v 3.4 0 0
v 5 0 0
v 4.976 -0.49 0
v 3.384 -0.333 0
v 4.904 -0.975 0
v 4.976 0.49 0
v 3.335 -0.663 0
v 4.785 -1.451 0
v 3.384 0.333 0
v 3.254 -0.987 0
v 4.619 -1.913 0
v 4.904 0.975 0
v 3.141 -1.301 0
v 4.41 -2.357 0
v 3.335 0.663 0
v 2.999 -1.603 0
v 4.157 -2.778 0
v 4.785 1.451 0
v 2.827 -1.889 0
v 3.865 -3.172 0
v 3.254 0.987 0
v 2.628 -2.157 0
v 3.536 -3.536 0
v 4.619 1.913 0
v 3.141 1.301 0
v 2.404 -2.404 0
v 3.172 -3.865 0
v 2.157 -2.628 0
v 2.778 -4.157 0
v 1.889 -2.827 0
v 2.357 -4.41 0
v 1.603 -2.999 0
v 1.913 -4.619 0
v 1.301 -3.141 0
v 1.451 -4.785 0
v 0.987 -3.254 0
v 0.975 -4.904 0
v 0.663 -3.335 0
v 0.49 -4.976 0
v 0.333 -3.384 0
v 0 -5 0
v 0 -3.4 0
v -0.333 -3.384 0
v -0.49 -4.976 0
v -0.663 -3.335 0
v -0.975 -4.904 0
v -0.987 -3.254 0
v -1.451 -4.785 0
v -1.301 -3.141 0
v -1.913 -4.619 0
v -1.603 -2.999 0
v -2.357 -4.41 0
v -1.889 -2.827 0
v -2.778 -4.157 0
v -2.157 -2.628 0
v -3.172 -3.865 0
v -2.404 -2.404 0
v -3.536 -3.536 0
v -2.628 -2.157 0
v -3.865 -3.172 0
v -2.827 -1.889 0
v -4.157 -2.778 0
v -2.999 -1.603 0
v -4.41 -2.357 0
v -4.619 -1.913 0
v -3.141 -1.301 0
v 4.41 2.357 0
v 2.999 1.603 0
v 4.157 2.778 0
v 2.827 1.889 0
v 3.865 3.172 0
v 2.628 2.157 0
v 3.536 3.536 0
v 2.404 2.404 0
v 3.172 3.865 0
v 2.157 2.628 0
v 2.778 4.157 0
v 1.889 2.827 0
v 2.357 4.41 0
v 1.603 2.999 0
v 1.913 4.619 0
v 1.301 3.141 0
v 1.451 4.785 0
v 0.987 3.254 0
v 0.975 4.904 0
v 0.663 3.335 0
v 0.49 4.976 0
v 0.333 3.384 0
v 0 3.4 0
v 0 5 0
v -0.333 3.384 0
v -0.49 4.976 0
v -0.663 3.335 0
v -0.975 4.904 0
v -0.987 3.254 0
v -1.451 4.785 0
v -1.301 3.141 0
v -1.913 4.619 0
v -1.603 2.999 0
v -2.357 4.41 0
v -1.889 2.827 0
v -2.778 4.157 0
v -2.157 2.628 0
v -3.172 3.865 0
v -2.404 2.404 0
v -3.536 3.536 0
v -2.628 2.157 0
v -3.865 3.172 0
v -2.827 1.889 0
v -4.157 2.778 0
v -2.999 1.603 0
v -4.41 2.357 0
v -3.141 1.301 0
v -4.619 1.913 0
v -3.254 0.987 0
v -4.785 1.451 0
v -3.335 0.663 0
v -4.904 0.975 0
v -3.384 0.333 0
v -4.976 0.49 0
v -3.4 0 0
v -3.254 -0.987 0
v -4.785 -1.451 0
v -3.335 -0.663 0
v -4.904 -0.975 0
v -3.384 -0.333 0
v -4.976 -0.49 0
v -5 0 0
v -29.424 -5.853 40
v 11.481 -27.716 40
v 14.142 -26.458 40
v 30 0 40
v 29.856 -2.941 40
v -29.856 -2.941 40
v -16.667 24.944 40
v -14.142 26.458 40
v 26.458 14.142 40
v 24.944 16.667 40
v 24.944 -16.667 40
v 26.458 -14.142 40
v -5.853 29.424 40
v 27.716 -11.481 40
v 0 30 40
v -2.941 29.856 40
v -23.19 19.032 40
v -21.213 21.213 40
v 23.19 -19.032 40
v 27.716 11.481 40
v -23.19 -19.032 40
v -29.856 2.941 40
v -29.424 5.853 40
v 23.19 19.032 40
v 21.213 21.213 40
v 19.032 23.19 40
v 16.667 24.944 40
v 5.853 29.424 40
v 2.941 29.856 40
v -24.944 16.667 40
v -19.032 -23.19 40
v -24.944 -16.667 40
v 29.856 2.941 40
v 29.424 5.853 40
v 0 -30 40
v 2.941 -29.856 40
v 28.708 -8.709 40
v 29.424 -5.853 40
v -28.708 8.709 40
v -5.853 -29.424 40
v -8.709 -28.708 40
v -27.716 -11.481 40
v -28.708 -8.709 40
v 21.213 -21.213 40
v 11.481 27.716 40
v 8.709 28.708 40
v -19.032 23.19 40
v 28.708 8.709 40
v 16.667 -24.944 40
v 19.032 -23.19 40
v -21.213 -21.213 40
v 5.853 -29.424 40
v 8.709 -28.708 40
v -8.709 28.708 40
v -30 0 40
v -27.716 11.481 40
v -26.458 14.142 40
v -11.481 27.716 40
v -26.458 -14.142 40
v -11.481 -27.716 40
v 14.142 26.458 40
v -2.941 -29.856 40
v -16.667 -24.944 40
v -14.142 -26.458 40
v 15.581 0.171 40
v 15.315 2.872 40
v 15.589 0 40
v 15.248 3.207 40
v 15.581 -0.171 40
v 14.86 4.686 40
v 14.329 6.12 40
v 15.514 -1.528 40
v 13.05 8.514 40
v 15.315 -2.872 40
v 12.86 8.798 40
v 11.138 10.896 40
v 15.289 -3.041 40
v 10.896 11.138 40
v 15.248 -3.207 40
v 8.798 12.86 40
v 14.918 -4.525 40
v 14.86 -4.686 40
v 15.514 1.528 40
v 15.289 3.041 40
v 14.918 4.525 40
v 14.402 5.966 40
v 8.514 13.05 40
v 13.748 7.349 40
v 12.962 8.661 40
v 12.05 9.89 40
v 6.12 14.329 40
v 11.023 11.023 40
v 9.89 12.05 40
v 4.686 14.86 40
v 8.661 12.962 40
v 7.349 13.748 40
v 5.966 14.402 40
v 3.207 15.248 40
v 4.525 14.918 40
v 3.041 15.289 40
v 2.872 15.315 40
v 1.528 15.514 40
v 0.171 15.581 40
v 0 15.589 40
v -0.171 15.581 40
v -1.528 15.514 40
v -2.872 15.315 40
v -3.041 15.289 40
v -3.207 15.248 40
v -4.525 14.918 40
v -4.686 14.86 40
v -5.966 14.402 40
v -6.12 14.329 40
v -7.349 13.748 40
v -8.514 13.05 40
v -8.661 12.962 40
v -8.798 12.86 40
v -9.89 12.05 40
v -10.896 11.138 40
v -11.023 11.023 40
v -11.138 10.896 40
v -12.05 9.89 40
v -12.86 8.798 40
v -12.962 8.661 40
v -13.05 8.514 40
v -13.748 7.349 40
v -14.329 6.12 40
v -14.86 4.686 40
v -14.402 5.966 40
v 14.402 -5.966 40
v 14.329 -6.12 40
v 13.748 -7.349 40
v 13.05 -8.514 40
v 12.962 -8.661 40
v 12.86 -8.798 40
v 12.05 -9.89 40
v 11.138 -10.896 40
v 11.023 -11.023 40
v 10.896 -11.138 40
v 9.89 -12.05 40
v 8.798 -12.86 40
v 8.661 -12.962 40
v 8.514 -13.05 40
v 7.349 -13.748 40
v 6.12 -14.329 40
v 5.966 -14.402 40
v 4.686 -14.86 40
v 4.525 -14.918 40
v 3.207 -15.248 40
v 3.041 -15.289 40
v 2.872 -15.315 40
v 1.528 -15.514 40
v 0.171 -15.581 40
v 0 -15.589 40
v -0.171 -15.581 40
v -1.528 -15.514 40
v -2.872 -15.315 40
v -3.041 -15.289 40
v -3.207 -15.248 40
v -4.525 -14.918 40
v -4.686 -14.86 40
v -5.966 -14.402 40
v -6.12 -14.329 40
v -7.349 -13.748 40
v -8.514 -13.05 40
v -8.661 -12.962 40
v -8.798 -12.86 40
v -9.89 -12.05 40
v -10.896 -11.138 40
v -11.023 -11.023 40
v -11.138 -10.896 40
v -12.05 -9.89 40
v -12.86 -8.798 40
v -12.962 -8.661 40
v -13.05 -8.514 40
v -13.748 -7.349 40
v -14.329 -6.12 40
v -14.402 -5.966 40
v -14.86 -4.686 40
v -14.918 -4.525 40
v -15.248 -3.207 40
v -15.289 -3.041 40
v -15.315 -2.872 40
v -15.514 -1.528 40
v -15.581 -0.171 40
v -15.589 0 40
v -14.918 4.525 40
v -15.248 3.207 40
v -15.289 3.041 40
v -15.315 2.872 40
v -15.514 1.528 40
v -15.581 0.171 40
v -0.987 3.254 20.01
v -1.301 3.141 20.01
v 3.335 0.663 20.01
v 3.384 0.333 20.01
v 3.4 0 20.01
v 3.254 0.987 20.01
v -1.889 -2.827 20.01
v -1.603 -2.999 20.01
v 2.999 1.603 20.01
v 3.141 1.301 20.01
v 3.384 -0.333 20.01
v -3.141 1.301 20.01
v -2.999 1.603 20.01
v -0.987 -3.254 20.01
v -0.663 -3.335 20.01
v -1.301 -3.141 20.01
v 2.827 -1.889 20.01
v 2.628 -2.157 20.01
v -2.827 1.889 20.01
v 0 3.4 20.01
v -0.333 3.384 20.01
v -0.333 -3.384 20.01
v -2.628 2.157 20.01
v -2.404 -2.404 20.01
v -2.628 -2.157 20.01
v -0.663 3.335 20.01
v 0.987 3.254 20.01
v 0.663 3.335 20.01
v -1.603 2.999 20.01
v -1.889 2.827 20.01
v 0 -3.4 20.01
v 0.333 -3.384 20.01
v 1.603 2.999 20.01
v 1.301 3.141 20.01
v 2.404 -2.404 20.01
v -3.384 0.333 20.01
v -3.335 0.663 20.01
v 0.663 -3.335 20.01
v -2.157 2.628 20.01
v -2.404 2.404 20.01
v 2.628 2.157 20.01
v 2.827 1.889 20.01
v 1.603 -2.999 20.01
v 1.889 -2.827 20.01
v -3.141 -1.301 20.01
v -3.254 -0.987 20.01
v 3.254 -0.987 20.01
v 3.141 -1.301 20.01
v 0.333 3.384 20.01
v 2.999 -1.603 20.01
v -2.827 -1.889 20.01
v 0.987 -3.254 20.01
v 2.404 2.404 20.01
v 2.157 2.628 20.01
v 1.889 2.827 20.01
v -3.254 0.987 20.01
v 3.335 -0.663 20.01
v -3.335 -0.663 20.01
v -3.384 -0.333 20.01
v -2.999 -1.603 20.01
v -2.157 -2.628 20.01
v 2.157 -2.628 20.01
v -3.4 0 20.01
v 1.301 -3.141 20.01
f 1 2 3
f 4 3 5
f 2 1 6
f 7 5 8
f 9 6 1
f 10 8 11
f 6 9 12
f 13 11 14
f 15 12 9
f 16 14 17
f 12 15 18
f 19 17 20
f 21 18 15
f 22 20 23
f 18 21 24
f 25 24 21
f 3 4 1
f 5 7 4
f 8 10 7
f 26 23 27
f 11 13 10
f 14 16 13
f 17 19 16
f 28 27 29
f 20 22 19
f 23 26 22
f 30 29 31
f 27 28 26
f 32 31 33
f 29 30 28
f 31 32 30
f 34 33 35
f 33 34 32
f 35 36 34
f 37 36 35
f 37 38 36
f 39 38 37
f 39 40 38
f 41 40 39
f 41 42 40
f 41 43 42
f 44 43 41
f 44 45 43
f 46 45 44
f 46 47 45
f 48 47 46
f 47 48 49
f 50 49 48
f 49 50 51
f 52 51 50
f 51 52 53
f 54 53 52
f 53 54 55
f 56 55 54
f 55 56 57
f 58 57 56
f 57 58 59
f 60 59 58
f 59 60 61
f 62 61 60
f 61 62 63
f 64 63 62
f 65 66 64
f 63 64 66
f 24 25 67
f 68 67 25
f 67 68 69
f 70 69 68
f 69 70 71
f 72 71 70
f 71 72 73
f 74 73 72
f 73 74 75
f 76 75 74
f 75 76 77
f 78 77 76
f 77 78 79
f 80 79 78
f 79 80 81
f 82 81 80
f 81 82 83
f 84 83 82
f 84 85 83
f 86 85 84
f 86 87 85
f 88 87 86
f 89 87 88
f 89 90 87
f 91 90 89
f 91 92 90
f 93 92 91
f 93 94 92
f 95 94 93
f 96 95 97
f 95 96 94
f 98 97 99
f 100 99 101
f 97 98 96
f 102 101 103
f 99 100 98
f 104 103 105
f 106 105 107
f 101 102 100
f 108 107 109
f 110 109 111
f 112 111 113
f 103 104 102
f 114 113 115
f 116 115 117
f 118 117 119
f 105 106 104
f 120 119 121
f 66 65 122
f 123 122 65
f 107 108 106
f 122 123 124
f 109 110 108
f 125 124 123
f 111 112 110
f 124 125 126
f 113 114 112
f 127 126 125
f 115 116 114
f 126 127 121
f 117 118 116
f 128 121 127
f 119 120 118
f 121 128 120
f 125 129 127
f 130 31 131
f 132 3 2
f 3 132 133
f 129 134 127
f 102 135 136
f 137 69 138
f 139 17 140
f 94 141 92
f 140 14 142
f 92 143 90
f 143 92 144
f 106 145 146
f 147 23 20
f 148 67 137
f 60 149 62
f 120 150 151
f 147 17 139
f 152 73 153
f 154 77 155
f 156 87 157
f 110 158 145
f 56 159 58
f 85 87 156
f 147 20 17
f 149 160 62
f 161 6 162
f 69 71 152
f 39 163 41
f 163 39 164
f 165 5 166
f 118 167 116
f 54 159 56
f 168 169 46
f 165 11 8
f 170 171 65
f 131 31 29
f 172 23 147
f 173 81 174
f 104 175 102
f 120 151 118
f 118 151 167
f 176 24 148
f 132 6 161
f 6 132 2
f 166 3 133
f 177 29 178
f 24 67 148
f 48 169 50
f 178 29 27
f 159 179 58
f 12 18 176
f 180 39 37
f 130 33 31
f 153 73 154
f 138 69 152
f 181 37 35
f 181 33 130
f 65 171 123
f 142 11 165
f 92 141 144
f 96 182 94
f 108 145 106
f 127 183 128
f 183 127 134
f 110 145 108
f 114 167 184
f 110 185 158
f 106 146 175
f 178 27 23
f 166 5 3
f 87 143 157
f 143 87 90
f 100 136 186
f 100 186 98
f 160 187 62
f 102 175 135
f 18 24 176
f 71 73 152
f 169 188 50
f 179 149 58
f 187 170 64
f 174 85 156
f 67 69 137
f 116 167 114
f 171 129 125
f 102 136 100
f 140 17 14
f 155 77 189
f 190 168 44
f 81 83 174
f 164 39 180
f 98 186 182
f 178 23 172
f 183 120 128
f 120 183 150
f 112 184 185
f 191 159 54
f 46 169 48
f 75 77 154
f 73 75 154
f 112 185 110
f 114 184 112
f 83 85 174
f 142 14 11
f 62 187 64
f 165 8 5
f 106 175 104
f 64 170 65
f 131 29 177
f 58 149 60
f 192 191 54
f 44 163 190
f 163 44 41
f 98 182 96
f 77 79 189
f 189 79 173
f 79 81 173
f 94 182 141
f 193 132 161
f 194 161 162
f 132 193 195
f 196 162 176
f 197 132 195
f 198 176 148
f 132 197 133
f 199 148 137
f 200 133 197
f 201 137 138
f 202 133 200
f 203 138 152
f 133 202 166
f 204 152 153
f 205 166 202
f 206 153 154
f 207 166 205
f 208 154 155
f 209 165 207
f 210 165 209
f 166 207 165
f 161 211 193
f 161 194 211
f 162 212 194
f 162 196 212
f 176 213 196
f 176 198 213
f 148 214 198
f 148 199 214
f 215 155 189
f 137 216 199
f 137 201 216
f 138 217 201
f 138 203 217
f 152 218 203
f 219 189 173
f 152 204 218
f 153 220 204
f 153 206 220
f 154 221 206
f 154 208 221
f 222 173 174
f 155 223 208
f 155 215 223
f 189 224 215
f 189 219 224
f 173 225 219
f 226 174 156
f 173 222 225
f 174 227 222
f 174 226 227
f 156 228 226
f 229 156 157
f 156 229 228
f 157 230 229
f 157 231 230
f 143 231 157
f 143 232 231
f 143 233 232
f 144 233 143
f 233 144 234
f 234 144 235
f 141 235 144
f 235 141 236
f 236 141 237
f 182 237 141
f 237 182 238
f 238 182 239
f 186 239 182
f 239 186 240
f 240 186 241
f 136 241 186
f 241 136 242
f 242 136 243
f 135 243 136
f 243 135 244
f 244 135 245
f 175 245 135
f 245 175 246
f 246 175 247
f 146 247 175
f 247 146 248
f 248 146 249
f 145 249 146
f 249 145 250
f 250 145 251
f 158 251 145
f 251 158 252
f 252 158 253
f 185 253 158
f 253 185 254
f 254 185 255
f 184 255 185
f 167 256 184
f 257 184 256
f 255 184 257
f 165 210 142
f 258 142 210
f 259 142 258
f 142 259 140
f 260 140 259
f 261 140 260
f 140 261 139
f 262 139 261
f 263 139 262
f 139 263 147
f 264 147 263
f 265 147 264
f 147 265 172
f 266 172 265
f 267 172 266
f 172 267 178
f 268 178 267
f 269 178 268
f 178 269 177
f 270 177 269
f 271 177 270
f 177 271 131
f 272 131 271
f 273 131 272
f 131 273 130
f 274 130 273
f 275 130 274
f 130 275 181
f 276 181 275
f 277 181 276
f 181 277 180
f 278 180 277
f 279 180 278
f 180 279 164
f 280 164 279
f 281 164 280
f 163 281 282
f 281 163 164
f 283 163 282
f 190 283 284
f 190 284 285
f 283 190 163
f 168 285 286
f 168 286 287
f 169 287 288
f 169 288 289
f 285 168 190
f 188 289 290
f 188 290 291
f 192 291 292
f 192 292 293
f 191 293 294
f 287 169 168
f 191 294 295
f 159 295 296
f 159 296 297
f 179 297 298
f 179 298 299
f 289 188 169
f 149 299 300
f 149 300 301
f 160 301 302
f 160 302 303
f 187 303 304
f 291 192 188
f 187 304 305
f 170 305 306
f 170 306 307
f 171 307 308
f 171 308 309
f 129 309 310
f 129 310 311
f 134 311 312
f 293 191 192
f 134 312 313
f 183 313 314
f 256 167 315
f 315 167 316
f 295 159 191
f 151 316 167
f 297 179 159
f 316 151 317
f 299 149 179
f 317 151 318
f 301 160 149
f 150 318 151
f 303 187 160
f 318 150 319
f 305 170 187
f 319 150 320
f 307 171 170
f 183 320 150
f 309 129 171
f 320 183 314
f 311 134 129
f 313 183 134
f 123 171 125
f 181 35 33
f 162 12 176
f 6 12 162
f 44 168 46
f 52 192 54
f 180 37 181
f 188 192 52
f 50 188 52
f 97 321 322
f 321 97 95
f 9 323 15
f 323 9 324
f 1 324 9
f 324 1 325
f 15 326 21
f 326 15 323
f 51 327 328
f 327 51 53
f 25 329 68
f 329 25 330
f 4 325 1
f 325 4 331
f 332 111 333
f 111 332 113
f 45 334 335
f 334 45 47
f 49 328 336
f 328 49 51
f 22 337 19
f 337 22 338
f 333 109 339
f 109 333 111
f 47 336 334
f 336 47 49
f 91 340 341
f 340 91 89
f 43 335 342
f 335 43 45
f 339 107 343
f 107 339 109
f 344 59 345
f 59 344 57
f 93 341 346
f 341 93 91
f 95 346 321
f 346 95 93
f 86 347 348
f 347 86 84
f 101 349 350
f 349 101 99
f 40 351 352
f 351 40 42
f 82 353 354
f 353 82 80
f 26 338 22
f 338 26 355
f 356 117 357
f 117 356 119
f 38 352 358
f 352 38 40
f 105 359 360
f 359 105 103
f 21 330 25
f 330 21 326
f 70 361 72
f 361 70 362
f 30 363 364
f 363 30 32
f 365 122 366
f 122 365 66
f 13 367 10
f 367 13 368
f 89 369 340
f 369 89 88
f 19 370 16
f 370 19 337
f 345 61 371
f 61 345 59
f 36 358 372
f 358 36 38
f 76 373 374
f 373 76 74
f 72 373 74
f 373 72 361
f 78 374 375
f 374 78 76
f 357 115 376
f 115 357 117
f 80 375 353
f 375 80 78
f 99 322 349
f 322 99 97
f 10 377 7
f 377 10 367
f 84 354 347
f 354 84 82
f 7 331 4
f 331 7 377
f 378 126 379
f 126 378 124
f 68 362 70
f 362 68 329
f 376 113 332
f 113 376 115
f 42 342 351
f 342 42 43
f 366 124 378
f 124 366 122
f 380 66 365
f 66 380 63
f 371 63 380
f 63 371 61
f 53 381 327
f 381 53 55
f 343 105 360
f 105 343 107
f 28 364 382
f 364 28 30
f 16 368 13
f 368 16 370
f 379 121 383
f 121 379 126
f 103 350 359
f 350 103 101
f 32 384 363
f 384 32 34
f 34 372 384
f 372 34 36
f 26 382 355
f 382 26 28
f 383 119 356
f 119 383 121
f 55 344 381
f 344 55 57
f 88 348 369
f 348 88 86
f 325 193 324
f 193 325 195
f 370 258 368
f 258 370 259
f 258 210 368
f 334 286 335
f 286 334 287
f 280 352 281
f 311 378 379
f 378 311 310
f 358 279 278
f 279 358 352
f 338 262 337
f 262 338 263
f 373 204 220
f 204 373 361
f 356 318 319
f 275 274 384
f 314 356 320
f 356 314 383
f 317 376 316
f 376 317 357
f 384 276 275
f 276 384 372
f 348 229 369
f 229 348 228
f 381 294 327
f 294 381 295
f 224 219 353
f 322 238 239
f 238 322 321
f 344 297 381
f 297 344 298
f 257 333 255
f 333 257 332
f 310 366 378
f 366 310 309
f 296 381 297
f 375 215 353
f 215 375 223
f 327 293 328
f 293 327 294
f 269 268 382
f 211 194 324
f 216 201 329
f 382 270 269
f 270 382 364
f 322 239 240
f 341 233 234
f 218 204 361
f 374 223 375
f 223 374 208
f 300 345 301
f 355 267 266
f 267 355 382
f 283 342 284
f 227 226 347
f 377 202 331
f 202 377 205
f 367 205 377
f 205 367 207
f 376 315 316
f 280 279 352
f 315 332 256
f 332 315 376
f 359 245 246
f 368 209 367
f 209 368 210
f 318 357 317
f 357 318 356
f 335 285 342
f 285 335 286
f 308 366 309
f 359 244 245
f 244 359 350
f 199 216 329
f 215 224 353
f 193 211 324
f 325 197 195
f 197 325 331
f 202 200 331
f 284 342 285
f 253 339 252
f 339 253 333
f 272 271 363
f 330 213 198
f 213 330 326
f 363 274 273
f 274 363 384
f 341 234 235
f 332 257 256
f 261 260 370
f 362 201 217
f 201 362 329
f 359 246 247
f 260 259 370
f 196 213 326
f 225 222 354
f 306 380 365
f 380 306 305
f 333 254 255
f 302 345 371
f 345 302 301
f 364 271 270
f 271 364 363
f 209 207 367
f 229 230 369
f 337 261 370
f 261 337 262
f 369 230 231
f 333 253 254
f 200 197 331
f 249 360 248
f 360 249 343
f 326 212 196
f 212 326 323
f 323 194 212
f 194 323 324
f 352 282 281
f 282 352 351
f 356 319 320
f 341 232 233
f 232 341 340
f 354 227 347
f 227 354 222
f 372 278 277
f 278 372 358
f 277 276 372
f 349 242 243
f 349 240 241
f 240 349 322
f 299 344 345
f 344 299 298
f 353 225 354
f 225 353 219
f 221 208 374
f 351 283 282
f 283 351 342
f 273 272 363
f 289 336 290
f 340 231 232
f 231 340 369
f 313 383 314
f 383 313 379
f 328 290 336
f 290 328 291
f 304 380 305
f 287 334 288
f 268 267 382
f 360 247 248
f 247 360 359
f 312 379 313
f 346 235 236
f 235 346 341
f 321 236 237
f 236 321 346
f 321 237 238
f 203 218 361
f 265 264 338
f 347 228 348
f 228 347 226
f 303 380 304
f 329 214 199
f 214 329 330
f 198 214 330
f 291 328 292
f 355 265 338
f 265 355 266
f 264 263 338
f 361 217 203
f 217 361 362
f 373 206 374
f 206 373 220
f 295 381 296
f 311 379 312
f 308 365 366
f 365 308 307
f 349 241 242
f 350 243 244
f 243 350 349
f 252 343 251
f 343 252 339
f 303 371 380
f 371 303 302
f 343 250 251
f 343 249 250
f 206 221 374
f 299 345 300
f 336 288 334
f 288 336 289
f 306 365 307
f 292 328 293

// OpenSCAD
// Funnel - a spout (tube) with a conical section above, open at both ends. NOVEL general part.
//

spout_d  = 10;
spout_l  = 20;
cone_top = 10;
cone_rim = 60;
wall     = 1.6;

$fn = 64;

ib = max(1.6, spout_d - 2 * wall);   // keep a bore even if the wall is thicker than the wall

translate([0, 0, 0])
difference() {
    union() {
        cylinder(h = spout_l, d = spout_d);                 // spout (tube)
        cylinder(h = cone_rim - spout_l, d1 = spout_d, d2 = cone_rim);   // cone above the spout
    }
    translate([0, 0, -1])
    cylinder(h = spout_l + 2, d = ib);                     // through-bore: the spout is hollow
    translate([0, 0, spout_l + 0.01])
    cylinder(h = cone_rim - spout_l + 1, d1 = ib, d2 = cone_rim - 2 * wall);   // thin the cone wall
}
